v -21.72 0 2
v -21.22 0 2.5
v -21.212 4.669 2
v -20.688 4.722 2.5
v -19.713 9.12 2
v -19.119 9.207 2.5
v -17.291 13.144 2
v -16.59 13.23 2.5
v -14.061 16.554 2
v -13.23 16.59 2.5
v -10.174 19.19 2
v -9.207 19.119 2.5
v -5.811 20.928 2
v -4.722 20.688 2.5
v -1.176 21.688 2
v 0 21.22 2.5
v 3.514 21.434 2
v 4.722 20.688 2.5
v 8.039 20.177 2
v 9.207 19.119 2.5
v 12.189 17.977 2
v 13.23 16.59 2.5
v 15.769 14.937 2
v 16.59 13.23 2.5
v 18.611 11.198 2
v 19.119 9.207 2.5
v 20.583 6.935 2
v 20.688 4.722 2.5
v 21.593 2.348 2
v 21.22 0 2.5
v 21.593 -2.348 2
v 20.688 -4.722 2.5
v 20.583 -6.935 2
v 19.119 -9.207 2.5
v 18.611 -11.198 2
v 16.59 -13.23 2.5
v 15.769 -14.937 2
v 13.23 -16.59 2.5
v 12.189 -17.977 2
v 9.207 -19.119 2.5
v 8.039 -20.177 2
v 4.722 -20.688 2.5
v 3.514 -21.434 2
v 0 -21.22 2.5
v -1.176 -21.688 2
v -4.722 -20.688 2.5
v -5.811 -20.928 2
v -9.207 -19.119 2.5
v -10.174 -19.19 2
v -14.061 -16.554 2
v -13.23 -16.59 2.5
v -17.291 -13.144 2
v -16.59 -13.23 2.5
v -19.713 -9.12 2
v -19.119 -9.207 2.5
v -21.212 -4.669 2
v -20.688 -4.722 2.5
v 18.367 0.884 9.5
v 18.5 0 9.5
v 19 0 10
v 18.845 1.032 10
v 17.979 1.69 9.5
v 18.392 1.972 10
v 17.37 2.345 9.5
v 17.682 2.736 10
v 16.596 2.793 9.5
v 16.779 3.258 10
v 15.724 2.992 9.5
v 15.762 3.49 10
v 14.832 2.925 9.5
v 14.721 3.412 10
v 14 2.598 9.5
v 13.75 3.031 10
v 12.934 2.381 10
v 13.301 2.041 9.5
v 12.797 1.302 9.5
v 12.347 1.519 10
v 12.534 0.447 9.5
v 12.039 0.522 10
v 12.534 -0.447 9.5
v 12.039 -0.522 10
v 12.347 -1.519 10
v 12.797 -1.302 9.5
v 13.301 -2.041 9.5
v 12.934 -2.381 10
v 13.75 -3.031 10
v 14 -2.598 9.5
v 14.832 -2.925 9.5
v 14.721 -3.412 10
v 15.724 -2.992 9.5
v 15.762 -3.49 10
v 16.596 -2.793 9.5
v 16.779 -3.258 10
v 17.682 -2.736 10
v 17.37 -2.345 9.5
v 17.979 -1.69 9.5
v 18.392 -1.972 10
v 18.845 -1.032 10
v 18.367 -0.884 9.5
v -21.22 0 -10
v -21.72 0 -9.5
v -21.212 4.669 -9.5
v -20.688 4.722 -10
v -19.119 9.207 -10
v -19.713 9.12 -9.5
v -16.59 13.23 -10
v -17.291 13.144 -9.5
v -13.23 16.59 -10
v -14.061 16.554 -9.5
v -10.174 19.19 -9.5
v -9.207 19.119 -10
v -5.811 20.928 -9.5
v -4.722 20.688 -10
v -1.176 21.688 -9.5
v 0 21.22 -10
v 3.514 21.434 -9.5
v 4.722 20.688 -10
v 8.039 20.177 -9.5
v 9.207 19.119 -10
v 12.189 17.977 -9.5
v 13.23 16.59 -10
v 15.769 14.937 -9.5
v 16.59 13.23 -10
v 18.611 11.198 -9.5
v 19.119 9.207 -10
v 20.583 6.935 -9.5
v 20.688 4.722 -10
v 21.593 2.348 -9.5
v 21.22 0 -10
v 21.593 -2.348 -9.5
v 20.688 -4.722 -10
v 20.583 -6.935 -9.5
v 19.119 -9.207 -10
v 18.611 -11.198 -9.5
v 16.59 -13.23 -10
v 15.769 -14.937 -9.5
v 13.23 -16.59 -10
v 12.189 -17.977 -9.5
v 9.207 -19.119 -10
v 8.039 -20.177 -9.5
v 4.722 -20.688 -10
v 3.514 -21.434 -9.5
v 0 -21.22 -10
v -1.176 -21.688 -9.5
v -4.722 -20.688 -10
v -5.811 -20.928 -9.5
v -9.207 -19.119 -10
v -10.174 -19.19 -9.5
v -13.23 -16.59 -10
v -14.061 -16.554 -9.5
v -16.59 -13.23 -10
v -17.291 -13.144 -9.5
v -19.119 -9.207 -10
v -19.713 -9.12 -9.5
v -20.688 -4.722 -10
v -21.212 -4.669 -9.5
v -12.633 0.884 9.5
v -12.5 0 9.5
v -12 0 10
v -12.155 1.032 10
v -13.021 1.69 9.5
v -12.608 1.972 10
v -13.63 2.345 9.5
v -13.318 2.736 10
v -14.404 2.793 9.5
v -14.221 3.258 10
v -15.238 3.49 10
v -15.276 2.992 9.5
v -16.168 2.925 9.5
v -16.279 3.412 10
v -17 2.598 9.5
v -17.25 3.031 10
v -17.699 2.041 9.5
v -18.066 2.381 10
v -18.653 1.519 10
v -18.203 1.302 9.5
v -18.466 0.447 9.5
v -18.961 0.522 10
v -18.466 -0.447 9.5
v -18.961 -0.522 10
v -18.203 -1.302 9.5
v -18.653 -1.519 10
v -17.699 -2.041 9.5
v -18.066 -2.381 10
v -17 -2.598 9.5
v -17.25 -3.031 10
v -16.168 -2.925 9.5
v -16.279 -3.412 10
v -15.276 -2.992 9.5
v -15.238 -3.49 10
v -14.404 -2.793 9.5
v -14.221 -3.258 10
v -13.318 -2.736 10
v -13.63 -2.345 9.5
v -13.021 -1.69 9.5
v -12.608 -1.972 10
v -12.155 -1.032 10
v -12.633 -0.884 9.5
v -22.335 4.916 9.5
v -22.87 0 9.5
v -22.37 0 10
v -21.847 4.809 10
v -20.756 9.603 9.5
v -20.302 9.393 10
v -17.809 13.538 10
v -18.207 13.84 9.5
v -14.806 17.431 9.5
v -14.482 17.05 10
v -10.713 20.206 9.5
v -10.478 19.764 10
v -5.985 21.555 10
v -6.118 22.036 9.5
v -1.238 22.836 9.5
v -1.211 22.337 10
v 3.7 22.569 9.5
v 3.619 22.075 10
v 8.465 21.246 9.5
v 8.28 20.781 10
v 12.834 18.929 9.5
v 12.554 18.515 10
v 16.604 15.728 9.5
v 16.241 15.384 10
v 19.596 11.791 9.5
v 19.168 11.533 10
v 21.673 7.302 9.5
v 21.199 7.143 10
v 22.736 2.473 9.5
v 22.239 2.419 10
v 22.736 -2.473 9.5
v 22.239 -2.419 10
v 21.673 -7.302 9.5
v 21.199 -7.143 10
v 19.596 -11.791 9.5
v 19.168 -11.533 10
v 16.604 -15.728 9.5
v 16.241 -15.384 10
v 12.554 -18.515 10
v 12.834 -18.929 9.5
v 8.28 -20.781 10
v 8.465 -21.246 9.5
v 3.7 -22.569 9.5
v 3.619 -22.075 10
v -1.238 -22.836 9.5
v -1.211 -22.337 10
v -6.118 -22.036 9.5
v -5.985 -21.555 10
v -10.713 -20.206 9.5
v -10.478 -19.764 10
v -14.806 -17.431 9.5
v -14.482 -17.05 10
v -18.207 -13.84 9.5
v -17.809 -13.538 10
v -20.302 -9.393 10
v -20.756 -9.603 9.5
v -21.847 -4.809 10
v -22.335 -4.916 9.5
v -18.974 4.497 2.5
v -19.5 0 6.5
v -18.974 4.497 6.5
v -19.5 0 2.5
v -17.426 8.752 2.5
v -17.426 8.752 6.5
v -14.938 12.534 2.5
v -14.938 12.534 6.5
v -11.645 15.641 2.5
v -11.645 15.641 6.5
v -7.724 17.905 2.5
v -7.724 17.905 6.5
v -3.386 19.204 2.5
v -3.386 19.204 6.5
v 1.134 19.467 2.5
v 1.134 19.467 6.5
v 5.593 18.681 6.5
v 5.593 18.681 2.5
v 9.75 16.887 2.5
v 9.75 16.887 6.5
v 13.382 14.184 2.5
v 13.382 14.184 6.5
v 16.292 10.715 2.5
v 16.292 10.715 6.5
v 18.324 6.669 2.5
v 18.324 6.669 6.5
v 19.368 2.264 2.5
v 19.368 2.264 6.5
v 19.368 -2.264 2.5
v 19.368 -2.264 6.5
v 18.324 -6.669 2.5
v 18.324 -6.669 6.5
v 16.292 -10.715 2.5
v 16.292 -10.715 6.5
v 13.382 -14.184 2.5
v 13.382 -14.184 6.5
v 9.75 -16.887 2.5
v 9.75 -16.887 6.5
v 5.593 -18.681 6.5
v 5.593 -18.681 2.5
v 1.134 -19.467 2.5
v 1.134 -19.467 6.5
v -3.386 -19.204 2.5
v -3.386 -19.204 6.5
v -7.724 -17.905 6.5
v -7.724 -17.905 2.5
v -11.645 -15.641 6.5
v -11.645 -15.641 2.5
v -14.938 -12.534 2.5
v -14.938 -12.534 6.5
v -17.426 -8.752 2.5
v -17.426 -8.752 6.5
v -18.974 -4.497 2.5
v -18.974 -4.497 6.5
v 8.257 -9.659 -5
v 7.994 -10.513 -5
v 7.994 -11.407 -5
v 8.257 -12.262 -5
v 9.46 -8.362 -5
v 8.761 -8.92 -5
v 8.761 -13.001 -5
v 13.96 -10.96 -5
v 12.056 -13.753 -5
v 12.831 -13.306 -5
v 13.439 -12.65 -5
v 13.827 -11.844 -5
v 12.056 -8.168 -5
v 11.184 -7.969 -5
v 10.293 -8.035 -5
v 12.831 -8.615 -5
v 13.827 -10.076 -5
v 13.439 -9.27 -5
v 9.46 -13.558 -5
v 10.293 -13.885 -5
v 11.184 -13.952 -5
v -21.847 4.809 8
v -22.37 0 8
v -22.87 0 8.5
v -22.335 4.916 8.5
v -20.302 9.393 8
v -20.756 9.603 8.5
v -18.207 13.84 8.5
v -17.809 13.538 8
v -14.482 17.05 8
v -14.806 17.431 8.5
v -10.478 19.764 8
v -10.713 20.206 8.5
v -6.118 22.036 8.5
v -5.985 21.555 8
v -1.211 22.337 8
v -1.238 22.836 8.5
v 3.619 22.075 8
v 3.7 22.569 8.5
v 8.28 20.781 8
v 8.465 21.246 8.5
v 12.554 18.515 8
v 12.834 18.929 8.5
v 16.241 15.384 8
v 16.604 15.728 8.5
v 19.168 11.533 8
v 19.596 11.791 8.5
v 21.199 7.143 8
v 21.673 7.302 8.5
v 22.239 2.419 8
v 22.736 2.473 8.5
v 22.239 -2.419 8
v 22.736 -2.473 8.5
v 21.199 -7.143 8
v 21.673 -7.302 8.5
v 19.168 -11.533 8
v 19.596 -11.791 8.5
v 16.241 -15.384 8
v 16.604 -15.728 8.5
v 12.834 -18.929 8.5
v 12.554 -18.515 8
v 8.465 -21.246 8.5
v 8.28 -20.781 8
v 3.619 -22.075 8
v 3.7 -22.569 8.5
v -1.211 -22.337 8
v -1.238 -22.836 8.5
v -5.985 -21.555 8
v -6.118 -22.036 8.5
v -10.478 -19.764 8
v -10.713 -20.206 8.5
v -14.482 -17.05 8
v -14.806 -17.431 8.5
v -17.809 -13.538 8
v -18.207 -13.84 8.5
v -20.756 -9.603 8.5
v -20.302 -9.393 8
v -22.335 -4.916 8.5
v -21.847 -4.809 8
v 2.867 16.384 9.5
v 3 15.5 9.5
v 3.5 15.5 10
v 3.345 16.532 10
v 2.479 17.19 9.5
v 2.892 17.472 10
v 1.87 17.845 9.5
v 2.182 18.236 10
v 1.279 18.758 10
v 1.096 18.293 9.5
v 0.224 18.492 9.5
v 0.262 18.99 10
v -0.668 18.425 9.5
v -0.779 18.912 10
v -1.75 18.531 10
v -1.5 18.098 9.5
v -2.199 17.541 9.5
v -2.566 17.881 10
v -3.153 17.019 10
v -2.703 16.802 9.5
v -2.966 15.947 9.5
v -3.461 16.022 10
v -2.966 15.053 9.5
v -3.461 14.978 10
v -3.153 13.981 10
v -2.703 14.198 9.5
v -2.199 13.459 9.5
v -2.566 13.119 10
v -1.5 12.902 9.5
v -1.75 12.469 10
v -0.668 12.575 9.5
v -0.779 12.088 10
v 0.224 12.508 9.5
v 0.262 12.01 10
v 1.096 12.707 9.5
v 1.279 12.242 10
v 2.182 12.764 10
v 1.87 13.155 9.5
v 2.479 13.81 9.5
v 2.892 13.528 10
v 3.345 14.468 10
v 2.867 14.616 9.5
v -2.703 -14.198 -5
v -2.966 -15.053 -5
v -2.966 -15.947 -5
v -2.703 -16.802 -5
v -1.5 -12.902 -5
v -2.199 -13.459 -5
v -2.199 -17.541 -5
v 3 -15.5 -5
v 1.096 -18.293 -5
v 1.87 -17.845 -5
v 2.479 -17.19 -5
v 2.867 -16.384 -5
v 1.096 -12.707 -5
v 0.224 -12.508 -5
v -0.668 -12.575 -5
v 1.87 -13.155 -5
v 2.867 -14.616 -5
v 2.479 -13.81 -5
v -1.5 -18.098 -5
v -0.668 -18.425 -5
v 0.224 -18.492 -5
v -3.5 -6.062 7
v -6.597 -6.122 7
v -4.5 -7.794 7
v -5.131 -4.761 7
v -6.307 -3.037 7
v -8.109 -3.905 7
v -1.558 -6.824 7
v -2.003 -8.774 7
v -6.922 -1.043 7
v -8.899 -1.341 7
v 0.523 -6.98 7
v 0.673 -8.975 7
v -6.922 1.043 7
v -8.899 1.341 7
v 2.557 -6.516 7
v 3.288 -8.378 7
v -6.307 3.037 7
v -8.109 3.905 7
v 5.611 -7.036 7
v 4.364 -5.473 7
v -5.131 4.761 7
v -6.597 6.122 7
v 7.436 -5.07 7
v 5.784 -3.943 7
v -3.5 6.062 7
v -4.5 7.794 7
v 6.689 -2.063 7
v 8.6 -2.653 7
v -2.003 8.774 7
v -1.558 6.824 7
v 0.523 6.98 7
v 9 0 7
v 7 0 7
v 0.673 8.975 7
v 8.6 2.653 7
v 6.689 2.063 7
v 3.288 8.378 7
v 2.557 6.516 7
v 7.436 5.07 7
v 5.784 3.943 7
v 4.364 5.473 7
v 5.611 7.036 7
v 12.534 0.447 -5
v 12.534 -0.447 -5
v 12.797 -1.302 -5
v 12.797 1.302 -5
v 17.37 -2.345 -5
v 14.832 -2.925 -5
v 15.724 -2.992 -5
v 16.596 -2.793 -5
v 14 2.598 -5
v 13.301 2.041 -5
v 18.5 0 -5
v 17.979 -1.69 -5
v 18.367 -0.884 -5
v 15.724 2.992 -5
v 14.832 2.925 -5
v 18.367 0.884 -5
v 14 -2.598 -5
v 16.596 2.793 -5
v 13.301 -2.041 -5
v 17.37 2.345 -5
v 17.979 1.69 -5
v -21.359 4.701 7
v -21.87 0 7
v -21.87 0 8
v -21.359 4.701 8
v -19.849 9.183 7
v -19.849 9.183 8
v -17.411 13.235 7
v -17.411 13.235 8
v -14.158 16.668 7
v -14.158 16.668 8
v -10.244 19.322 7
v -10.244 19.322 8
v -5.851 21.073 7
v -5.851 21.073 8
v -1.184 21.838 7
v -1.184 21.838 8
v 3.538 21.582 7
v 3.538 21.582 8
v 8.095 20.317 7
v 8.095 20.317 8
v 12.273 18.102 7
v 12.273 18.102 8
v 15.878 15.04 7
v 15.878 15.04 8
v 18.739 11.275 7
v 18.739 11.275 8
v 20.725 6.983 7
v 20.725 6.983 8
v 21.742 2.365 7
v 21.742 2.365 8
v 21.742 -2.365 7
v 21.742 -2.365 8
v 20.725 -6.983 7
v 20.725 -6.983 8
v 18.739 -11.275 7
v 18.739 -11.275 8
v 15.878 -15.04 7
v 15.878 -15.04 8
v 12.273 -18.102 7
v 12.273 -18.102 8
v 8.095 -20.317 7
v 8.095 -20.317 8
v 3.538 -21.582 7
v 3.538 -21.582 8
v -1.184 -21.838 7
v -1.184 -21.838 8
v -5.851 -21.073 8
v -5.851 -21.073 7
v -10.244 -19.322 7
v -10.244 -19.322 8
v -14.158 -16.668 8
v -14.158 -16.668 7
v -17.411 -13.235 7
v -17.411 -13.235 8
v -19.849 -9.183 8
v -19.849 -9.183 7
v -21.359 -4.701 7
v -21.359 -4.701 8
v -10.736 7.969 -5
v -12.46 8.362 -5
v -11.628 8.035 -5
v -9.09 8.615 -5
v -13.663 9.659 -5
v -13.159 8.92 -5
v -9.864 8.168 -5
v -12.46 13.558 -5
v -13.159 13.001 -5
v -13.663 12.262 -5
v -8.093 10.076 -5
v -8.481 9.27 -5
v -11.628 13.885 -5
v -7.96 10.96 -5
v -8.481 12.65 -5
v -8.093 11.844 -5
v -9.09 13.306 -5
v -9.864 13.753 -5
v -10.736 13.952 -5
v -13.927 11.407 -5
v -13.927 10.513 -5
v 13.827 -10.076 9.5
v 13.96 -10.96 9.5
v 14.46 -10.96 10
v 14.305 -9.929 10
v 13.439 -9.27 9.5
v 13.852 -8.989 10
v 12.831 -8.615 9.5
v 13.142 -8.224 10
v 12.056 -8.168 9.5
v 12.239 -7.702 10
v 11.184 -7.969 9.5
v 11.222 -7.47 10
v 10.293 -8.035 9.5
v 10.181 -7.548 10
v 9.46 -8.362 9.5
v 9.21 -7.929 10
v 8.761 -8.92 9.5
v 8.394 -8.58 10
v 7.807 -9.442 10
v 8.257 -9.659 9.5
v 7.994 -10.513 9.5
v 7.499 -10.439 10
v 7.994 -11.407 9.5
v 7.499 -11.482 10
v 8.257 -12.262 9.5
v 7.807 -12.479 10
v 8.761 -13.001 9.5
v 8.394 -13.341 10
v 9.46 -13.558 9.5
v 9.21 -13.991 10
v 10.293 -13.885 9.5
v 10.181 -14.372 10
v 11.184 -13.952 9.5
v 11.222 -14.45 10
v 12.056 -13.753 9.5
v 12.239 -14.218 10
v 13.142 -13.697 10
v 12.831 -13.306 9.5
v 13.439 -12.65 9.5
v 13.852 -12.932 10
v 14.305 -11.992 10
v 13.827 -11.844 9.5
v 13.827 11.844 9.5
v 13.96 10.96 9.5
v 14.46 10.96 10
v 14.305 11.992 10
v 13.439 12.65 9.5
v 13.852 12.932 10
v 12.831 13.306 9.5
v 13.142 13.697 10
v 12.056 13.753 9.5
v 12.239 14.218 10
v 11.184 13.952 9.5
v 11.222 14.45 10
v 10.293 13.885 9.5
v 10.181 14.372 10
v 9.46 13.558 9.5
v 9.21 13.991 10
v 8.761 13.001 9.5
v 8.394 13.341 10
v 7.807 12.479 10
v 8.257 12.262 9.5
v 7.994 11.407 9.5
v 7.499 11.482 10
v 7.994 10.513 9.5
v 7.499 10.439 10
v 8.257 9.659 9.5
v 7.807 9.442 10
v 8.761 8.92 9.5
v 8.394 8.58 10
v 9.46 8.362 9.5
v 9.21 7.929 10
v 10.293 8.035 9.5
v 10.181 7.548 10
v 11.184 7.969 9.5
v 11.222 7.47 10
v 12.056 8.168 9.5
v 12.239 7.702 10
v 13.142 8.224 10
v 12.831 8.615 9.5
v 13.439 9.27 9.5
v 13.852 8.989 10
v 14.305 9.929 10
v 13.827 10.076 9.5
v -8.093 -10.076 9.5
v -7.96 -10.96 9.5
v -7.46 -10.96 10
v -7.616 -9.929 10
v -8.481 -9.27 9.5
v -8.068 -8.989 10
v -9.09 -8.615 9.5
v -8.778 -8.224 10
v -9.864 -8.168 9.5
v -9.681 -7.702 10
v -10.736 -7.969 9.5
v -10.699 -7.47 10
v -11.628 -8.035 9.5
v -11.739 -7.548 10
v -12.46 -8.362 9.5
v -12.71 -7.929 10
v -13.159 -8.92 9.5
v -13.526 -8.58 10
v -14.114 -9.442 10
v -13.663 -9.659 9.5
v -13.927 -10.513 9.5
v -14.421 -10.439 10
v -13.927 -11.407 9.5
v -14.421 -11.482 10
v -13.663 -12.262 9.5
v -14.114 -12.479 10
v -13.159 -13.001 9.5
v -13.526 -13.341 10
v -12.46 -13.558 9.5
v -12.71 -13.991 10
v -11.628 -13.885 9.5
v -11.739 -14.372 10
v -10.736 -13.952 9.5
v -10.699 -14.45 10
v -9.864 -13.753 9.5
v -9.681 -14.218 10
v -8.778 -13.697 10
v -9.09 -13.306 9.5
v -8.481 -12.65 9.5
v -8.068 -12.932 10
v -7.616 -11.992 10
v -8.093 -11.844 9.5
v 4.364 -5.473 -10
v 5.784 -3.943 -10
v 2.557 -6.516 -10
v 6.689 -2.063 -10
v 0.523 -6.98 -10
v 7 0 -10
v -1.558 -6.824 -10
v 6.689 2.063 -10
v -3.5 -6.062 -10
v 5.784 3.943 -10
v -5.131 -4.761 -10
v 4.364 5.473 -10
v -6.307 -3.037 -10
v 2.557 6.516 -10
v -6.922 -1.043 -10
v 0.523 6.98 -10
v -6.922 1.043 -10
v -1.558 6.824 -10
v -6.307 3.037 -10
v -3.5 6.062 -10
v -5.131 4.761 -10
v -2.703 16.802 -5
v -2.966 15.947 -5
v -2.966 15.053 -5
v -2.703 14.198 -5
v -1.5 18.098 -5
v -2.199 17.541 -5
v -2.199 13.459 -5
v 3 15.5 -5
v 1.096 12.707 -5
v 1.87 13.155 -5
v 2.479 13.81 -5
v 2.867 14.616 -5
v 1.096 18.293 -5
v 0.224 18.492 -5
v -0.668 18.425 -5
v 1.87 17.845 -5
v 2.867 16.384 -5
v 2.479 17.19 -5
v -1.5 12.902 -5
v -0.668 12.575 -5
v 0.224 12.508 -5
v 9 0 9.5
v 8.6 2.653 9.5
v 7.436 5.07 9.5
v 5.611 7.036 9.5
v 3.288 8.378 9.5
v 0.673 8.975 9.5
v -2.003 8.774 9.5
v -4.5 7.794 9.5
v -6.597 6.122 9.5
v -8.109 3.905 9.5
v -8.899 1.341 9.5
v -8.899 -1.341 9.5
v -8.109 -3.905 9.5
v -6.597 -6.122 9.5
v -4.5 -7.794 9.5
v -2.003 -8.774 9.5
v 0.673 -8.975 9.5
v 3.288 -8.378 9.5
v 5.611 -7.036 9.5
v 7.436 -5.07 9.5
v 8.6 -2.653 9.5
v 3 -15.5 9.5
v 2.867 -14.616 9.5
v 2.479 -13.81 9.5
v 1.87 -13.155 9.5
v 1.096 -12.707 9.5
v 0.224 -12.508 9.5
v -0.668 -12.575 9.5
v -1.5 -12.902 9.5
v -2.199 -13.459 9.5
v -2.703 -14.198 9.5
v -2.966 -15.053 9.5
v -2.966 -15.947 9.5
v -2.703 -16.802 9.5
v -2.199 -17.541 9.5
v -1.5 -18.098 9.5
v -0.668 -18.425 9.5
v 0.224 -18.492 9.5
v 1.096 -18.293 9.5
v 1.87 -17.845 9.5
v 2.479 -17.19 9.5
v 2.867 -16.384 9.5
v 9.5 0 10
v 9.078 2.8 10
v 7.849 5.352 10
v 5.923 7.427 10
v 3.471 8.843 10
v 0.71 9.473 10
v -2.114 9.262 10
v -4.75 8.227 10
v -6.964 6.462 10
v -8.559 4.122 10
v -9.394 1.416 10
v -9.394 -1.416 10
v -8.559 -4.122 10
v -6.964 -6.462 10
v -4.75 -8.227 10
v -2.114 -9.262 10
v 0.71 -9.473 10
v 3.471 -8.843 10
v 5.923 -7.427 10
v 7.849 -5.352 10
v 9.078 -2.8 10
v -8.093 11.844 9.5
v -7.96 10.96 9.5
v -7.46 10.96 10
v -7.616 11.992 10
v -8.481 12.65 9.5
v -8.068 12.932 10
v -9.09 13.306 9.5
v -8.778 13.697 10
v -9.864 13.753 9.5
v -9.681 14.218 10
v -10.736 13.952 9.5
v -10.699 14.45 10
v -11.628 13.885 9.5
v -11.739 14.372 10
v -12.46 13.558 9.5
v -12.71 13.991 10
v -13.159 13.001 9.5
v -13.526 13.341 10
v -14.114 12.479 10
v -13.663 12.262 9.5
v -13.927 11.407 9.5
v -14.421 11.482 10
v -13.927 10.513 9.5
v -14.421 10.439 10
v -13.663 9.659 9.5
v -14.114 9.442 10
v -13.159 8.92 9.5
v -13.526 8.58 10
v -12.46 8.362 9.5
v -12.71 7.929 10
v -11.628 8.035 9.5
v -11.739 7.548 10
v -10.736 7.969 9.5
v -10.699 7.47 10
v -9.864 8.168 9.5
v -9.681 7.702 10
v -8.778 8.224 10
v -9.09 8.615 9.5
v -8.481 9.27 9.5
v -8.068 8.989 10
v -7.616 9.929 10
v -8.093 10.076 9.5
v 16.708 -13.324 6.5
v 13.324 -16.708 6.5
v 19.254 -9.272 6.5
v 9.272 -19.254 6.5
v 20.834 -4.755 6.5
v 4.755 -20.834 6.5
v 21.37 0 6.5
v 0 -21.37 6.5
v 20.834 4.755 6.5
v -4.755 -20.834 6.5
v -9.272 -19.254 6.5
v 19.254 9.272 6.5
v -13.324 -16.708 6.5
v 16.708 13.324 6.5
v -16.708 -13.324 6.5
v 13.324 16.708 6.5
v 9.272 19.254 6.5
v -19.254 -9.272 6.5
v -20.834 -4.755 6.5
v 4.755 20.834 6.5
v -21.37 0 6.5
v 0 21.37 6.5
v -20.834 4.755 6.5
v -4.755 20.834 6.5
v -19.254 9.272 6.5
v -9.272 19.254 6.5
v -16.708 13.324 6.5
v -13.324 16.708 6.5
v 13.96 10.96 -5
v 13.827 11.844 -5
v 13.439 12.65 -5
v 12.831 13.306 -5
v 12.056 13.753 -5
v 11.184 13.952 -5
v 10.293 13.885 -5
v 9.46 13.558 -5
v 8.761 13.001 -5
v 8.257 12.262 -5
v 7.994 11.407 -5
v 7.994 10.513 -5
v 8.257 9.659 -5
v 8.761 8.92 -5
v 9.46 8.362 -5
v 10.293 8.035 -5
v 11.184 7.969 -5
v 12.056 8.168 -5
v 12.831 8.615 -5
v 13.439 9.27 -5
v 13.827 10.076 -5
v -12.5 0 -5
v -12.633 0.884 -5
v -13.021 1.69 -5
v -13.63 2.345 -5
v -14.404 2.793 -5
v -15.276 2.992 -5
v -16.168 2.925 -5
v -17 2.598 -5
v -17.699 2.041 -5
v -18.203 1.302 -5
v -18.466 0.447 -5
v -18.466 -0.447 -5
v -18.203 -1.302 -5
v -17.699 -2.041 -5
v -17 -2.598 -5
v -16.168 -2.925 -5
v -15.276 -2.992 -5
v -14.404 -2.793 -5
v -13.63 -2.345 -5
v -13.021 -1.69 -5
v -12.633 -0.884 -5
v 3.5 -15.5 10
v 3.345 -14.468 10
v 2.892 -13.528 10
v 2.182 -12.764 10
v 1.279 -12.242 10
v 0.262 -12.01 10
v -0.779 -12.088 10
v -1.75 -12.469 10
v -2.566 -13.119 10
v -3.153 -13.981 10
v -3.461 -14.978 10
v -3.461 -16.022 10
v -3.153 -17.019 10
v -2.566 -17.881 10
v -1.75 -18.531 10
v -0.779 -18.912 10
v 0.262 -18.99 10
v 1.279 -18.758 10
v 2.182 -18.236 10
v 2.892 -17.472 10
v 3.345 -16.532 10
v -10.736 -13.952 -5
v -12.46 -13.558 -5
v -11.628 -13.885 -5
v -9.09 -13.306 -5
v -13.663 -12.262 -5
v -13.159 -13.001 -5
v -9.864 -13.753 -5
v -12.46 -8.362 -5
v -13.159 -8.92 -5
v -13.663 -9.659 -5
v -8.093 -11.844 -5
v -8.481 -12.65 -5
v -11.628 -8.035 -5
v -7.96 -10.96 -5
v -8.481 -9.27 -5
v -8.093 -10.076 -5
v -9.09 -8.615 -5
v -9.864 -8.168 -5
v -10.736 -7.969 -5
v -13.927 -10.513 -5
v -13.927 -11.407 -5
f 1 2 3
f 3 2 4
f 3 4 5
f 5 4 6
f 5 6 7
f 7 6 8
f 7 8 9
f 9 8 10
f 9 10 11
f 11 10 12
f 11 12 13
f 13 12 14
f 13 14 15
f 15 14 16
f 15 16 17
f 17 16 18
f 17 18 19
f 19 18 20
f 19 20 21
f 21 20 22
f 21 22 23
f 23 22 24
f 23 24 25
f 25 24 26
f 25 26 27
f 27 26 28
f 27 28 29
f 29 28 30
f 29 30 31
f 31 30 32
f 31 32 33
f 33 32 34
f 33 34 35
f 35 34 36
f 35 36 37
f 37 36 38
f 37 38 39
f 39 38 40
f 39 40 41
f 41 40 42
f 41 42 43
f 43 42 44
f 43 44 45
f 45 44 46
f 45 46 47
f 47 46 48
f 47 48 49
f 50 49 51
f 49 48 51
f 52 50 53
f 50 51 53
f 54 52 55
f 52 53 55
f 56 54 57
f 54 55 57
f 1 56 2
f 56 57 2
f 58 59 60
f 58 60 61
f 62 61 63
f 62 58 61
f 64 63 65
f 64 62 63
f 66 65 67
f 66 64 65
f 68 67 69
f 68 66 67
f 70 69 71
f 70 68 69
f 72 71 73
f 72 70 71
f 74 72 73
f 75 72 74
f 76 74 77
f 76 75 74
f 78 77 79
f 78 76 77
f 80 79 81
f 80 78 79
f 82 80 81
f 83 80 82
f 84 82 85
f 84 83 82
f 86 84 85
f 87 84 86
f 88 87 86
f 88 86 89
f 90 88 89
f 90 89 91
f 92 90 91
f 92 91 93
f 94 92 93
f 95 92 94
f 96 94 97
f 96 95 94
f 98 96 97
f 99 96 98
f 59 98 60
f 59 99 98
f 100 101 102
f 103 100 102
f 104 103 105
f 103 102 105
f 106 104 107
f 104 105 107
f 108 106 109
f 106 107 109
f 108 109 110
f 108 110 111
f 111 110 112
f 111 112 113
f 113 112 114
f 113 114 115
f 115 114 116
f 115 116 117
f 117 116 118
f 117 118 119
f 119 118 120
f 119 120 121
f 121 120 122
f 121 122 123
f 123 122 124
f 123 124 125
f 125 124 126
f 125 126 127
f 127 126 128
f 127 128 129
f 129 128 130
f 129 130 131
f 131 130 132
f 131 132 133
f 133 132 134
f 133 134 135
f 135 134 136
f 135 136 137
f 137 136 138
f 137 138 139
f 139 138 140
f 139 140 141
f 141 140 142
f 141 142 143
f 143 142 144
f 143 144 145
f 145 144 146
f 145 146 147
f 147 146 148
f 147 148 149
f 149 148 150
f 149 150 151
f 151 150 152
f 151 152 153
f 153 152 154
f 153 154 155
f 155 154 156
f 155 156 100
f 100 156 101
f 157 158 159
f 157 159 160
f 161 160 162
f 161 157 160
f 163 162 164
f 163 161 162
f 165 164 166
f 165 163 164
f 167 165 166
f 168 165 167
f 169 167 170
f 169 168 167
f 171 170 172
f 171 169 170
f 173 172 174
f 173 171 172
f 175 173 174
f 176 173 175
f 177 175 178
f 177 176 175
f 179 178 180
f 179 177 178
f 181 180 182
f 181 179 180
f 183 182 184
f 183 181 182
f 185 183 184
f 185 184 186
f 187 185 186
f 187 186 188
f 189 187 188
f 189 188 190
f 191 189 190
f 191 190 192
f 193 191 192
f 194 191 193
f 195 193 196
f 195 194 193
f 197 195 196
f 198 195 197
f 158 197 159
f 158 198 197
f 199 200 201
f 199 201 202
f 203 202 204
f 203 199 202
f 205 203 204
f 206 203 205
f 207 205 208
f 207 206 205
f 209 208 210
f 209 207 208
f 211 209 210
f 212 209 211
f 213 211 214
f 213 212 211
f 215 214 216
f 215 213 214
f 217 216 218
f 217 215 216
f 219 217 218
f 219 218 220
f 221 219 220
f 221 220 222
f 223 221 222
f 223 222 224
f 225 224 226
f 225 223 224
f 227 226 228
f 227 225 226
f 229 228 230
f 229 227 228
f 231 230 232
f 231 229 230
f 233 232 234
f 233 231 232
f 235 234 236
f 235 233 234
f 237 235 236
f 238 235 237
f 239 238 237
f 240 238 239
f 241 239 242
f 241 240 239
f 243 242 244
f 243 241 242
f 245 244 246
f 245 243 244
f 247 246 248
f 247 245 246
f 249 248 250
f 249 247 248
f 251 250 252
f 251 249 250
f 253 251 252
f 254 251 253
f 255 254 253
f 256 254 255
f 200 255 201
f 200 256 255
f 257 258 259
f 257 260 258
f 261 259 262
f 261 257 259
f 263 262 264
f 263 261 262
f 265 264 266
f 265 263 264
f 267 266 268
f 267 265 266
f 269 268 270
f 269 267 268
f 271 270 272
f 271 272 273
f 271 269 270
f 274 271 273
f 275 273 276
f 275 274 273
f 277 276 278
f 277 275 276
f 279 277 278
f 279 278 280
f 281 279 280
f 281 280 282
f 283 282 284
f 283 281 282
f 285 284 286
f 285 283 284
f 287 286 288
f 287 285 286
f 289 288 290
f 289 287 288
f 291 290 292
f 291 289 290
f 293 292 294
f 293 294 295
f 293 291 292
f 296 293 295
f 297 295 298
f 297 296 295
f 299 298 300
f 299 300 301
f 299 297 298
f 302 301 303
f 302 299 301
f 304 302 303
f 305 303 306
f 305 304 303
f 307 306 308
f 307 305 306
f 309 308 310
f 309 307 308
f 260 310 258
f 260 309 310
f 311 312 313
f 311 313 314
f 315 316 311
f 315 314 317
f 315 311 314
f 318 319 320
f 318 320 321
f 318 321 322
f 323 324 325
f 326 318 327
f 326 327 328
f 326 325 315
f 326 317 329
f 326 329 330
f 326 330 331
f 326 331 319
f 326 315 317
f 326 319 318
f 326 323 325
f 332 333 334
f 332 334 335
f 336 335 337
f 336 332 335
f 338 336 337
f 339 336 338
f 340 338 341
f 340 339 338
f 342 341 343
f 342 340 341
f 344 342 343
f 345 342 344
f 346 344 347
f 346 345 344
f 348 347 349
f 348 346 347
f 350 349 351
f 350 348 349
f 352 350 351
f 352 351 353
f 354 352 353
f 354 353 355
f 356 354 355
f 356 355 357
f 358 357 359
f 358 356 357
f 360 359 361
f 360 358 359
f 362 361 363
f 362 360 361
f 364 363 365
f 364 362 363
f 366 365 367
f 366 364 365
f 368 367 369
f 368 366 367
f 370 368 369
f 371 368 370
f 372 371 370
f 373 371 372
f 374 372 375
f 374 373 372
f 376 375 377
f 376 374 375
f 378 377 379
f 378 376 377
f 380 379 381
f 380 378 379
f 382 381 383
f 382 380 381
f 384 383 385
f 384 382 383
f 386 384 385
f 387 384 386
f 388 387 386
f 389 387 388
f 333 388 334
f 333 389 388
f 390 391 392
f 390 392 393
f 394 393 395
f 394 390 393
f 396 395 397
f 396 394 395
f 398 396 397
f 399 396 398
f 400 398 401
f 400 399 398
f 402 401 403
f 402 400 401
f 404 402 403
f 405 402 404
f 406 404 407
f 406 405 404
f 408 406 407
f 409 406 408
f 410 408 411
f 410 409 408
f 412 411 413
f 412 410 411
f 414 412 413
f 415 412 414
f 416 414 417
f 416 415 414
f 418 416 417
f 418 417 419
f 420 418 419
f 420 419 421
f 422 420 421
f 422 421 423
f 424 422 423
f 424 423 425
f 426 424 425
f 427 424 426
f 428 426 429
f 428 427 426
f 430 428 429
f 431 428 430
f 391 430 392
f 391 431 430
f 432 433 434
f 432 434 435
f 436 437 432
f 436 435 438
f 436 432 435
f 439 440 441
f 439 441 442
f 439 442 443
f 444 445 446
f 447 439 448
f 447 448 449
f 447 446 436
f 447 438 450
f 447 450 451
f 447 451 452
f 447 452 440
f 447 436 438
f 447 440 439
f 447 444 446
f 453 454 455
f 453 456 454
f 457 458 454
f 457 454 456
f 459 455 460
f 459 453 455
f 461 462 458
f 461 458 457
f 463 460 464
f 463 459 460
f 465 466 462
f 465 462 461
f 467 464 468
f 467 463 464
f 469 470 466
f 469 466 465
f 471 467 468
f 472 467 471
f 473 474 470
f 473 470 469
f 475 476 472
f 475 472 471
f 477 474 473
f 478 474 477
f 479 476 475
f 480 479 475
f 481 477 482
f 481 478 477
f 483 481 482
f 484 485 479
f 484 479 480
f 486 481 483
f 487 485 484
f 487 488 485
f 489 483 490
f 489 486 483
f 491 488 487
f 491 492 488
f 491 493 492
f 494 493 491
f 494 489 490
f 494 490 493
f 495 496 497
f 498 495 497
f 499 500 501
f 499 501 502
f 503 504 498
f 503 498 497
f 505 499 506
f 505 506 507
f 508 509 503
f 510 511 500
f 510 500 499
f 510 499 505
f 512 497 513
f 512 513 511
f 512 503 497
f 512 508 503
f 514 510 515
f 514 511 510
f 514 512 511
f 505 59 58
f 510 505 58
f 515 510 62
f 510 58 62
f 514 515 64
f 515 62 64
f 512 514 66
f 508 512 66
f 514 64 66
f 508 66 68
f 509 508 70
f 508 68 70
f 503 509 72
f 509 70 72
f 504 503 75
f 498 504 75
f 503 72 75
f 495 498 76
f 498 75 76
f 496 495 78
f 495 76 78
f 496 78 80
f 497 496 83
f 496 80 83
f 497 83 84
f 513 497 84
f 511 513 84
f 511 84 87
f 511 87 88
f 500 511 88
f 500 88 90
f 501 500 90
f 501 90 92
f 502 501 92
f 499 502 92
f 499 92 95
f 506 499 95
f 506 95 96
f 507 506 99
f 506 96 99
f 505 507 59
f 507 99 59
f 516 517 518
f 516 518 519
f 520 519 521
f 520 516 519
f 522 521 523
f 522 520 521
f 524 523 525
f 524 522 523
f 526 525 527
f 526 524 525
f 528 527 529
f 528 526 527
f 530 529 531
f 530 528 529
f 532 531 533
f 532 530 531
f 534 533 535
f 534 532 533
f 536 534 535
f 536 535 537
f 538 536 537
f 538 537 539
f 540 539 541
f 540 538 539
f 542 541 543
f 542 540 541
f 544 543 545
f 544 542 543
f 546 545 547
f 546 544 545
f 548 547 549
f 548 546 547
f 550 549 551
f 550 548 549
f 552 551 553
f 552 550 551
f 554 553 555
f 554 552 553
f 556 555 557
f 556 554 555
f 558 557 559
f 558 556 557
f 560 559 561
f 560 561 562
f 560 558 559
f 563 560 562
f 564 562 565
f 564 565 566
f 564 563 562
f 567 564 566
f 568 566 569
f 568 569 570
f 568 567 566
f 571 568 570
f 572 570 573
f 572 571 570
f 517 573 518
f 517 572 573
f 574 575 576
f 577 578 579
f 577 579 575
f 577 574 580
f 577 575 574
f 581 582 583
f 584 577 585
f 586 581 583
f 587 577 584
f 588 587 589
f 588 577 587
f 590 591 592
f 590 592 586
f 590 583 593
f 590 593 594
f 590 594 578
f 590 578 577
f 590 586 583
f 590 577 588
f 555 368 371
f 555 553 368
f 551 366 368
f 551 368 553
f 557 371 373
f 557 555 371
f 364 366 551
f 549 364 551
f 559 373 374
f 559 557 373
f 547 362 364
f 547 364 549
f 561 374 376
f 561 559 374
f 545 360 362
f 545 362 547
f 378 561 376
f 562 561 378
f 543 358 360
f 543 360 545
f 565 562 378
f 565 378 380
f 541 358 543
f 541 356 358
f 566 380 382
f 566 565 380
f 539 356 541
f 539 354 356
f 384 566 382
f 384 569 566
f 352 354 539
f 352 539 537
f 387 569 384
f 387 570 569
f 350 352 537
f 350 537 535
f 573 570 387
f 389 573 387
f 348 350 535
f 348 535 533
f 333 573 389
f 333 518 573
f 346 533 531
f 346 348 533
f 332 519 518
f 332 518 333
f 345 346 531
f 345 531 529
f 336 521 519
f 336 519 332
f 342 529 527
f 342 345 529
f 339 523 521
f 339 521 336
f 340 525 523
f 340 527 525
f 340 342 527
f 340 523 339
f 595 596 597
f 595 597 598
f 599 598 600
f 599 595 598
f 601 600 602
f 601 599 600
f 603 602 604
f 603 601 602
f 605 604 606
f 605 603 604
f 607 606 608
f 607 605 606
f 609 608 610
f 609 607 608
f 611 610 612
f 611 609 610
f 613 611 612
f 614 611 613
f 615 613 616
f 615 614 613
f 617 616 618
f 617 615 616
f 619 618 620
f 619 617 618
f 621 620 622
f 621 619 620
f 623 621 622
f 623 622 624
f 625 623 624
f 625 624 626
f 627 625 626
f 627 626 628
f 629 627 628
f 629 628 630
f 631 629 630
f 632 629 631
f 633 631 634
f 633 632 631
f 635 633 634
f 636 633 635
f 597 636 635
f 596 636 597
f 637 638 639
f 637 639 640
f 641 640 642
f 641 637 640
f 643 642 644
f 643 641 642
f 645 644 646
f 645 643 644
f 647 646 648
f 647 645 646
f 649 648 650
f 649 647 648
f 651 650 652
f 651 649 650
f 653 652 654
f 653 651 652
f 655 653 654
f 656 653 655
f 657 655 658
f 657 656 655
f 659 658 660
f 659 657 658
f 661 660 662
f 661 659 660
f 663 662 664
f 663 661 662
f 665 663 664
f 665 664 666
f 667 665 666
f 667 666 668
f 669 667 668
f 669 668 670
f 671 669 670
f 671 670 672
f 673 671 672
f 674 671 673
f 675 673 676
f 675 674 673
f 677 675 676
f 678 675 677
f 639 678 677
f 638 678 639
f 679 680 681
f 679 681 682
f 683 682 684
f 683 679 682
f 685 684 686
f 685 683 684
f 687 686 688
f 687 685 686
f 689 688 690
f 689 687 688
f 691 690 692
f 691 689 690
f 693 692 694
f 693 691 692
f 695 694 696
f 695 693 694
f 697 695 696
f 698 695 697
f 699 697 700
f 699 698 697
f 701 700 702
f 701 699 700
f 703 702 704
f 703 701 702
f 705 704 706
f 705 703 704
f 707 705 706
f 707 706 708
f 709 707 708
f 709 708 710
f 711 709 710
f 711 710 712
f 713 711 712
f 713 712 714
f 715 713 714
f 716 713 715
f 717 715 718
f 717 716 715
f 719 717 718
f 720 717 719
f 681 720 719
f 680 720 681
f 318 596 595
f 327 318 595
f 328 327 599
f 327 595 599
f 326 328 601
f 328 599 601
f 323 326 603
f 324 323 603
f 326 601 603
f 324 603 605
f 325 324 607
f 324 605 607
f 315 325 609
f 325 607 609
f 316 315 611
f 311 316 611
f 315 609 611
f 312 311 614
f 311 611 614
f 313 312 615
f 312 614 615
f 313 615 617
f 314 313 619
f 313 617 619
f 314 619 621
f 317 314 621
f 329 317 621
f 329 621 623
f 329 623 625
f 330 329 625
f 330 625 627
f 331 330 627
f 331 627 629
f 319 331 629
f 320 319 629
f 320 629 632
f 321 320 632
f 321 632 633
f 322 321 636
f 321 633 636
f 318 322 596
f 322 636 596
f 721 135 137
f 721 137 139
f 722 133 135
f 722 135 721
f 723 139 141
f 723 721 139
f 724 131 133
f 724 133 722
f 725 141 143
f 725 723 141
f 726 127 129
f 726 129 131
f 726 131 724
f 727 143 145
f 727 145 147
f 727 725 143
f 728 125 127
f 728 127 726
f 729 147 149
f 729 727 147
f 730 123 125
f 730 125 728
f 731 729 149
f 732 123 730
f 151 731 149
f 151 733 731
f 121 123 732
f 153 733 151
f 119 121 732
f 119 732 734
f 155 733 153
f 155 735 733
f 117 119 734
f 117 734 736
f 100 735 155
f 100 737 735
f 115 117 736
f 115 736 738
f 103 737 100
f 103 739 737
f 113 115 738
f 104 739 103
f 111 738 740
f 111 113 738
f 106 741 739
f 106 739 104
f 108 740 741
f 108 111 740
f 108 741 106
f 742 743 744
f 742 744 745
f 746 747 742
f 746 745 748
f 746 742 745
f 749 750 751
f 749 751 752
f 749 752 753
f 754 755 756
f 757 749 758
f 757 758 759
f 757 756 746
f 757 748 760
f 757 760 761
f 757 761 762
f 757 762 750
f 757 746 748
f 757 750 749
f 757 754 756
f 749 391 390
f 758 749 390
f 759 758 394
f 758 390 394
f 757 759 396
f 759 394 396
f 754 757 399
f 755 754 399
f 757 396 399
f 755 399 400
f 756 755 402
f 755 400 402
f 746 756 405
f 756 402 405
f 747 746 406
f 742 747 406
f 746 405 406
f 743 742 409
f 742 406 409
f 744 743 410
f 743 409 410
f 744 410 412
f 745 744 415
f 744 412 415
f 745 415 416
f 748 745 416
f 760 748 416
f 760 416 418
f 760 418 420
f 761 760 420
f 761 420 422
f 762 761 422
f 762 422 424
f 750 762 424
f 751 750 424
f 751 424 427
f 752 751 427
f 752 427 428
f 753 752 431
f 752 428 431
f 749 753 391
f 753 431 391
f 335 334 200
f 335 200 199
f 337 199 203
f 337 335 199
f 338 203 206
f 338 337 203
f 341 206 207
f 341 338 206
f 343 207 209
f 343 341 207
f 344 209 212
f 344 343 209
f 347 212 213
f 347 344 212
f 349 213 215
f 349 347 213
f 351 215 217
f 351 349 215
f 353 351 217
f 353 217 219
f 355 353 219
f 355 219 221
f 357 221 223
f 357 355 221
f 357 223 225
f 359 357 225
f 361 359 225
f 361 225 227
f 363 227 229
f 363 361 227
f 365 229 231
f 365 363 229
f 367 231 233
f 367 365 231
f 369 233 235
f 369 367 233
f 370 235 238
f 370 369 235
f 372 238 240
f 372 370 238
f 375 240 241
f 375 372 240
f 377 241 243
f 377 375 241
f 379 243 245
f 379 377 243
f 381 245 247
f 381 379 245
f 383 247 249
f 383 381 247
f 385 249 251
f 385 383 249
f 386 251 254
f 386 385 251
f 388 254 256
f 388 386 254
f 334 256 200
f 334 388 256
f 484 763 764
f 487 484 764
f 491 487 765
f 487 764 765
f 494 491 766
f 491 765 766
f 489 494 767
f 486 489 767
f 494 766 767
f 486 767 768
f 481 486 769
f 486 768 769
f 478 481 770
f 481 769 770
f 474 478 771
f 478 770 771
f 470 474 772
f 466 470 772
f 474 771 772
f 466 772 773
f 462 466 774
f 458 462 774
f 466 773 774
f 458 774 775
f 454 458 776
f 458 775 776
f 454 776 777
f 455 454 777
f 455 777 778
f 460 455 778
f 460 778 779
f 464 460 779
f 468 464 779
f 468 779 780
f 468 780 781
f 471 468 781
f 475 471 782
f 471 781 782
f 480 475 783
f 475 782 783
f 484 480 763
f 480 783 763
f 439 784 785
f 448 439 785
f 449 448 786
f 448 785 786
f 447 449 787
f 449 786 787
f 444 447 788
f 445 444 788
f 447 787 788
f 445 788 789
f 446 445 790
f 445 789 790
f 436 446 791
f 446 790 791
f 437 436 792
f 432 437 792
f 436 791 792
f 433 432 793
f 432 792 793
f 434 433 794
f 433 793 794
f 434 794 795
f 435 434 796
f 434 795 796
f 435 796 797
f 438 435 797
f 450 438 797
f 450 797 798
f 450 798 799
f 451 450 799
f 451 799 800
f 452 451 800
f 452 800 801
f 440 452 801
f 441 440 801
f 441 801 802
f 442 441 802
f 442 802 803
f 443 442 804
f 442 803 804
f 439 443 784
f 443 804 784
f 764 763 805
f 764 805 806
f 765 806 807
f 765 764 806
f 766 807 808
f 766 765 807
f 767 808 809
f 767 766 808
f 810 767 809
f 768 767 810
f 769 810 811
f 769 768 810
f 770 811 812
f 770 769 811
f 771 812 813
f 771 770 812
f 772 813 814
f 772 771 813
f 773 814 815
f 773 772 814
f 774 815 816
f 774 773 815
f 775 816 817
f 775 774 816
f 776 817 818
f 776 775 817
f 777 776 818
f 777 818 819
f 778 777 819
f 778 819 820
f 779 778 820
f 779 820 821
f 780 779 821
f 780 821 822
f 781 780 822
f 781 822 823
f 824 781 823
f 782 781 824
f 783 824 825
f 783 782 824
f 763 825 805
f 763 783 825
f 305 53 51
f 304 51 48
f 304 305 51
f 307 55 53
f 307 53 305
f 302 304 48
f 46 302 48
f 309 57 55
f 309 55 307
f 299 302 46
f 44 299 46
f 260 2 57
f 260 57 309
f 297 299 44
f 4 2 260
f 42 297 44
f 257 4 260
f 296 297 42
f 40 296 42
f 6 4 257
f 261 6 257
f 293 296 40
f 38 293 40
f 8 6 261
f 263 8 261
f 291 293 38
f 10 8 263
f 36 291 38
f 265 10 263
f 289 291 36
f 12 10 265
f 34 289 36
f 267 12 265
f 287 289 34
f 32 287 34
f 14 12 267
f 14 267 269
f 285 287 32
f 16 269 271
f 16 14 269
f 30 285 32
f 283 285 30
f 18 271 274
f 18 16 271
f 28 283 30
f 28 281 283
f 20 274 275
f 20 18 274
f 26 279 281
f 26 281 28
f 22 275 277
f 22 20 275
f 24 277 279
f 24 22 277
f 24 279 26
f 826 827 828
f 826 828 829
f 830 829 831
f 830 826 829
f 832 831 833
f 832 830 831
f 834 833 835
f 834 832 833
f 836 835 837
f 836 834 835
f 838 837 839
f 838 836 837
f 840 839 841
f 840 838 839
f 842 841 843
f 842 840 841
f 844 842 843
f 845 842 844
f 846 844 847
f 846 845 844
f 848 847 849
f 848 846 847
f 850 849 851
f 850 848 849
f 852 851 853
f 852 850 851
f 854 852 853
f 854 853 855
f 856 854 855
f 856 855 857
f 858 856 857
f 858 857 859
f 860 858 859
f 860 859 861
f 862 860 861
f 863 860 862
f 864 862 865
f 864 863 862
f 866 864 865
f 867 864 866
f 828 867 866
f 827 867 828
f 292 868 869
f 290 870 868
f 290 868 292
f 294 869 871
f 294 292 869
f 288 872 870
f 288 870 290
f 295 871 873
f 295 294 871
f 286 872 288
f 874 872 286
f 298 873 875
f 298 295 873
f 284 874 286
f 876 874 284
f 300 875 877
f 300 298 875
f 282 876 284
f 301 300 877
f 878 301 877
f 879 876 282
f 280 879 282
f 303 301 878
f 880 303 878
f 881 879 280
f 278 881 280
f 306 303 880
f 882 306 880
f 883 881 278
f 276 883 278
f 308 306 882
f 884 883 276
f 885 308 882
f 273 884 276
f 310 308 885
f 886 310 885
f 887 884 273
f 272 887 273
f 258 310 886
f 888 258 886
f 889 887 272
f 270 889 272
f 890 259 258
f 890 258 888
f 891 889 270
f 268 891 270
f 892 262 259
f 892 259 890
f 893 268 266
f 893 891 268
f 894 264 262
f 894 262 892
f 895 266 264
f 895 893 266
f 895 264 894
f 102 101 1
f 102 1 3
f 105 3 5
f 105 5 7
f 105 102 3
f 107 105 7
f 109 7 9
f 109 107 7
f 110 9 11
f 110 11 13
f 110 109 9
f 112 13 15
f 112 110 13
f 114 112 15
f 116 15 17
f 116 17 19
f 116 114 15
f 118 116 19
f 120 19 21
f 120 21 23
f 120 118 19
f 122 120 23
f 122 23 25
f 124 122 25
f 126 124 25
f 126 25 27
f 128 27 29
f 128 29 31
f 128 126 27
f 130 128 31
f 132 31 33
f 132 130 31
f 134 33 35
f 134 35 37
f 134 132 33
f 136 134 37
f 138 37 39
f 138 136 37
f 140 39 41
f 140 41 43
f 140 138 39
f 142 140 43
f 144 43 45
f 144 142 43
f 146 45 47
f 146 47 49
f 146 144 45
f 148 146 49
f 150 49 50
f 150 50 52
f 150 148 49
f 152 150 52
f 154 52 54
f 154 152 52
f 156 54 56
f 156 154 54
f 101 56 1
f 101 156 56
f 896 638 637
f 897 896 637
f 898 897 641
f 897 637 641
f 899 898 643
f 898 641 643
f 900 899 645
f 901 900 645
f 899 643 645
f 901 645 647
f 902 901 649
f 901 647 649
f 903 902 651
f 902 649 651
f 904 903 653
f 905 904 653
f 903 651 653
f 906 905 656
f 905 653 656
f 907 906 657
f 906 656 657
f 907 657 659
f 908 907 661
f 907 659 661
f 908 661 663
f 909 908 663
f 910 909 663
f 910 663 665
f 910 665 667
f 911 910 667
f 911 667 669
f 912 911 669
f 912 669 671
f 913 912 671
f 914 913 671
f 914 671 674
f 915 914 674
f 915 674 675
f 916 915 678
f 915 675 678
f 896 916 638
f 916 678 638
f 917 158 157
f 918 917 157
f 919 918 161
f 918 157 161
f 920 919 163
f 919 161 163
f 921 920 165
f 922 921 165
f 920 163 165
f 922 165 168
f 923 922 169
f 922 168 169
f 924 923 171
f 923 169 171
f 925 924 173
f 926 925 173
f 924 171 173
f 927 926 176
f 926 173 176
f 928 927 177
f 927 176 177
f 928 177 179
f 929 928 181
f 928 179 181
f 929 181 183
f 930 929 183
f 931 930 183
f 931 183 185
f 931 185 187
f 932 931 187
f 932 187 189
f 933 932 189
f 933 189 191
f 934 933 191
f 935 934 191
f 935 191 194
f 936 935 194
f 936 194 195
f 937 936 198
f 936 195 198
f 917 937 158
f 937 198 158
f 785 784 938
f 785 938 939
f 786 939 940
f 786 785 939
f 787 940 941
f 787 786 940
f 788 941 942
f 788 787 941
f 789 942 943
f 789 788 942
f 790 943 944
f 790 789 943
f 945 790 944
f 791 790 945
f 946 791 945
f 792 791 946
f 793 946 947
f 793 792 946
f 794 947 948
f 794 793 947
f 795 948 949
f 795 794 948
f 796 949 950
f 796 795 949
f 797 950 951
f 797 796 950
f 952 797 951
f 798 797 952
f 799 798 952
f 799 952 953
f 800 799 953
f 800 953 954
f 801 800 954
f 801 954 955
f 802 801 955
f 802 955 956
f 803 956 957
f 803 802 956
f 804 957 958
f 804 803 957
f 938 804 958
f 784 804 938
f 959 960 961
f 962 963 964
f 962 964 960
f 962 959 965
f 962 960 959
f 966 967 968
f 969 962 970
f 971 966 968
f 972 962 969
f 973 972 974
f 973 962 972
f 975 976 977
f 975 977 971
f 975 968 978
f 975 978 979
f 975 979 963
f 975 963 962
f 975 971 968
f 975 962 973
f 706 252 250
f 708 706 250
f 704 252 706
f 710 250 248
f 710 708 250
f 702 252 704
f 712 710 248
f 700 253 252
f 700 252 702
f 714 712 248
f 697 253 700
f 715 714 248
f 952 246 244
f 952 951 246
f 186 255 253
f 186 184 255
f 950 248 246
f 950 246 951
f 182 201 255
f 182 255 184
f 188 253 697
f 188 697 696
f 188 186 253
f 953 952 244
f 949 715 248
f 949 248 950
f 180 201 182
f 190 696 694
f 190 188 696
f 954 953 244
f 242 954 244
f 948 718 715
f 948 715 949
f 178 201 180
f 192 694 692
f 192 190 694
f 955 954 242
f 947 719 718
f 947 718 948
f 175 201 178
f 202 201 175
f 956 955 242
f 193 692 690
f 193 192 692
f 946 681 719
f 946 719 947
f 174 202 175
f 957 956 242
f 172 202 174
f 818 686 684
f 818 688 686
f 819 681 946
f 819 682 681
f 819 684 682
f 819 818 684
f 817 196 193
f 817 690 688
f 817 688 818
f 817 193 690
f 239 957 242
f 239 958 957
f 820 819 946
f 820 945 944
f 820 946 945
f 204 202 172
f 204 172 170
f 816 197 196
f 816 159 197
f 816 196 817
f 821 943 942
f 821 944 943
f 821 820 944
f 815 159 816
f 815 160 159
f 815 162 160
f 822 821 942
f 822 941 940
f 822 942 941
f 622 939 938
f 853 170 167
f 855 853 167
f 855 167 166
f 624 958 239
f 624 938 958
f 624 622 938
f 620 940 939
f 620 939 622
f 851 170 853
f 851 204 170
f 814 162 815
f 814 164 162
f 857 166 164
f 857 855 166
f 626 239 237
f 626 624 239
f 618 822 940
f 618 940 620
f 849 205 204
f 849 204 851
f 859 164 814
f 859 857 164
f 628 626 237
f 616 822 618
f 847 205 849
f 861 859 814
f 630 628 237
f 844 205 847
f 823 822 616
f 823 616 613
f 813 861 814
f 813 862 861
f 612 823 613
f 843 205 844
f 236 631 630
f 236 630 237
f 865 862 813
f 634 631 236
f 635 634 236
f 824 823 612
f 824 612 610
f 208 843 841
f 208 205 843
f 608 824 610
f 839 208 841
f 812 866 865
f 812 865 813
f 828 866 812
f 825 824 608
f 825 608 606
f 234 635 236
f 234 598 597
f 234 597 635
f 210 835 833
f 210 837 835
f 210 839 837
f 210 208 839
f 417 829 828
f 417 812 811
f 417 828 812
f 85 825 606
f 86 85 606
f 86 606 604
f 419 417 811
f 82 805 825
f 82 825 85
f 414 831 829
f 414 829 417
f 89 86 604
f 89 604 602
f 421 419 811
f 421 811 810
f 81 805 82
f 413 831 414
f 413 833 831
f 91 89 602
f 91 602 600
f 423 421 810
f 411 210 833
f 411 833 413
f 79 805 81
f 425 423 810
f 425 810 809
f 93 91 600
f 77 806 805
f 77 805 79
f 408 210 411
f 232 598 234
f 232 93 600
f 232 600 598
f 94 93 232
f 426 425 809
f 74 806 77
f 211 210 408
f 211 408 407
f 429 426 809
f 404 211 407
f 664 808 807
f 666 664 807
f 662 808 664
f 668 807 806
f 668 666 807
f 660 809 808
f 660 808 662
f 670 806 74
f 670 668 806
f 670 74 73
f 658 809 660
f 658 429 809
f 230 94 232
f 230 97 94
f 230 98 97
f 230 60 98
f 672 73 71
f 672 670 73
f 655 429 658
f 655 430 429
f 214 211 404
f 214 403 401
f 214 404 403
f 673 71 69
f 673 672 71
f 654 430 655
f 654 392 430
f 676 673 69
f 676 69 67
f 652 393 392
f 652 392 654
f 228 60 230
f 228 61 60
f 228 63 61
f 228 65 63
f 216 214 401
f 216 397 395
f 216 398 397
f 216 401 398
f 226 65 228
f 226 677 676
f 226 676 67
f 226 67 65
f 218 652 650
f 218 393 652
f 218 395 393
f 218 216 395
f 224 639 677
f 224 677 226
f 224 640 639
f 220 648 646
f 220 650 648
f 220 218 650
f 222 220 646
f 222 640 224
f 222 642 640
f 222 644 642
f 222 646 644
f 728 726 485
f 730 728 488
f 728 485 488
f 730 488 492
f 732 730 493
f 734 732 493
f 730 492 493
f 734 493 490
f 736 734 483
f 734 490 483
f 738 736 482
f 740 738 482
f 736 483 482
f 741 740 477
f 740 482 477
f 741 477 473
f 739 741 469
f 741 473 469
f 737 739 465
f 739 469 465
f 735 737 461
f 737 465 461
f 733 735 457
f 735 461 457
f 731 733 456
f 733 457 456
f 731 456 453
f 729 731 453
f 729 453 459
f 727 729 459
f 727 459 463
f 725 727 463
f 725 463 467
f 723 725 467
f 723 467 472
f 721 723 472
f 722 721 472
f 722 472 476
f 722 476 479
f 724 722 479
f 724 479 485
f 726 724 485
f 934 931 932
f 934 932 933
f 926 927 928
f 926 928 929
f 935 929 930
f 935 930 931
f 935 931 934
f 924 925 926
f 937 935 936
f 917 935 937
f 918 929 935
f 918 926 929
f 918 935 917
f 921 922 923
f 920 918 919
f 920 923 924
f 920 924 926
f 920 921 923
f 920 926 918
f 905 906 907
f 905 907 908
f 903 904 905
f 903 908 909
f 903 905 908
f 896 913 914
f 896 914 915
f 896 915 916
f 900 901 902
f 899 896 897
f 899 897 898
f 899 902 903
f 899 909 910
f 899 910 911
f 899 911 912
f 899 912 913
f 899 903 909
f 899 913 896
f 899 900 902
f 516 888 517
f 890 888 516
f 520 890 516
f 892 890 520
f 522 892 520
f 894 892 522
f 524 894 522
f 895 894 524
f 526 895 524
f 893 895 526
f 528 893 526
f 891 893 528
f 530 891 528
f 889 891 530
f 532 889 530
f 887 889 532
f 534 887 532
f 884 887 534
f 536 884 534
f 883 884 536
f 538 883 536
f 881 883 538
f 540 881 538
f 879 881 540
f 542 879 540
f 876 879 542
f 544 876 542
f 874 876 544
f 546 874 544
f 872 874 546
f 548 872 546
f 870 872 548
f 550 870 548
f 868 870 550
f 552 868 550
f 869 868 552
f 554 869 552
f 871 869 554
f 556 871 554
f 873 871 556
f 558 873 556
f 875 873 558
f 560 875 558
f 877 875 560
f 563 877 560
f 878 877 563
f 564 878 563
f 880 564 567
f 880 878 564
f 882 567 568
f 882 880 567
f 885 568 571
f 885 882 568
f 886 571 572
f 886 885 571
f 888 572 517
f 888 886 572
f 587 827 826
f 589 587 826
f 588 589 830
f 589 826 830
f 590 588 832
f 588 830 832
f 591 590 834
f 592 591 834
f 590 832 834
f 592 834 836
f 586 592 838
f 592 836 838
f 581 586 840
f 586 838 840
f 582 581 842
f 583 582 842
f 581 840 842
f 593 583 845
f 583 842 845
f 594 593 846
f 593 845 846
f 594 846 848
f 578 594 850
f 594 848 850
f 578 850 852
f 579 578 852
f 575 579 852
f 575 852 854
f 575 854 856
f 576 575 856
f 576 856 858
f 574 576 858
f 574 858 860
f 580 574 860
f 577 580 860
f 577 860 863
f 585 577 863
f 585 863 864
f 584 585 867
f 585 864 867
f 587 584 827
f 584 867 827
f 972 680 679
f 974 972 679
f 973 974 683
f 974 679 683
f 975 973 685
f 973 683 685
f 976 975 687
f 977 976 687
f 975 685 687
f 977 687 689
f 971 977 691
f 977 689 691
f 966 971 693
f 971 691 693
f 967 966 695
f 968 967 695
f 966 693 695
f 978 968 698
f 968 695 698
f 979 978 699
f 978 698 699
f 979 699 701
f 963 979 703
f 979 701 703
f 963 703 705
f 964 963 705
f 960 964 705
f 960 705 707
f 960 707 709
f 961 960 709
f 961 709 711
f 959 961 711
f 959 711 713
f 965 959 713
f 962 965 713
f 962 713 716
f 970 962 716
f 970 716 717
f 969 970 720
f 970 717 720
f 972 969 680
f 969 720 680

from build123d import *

# Parameters (mm, degrees)
F2_R     = 7
F3_DEPTH = 20.001
F2_R_2   = 3
F4_DEPTH = 15
F2_R_3   = 9
F5_DEPTH = 3
F6_SIZE  = 0.5
F7_SIZE  = 0.5


with BuildPart() as f1:
    # F0 (on Front) → F1 (revolve)
    with BuildSketch(Plane.XZ):
        Polygon((0, -10), (0, 10), (-22.87, 10), (-22.87, 8), (-21.87, 8), (-21.87, 6.5), (-19.5, 6.5), (-19.5, 2.5), (-21.72, 2.5), (-21.72, -10), align=None)
    revolve(axis=Axis((0, 0, 0), (0, 0, -1)))

    # F2 (on face) → F3 (cut, through all)
    with BuildSketch(Plane.XY.offset(10)):
        Circle(F2_R)
    extrude(amount=-F3_DEPTH, mode=Mode.SUBTRACT)

    # F2 (on face) → F4 (cut)
    with BuildSketch(Plane.XY.offset(10)):
        with Locations((-10.960155, 10.960155)):
            Circle(F2_R_2)
        with Locations((10.960155, 10.960155)):
            Circle(F2_R_2)
        with Locations((15.5, 0)):
            Circle(F2_R_2)
        with Locations((10.960155, -10.960155)):
            Circle(F2_R_2)
        with Locations((0, -15.5)):
            Circle(F2_R_2)
        with Locations((-10.960155, -10.960155)):
            Circle(F2_R_2)
        with Locations((-15.5, 0)):
            Circle(F2_R_2)
        with Locations((0, 15.5)):
            Circle(F2_R_2)
    extrude(amount=-F4_DEPTH, mode=Mode.SUBTRACT)

    # F2 (on face) → F5 (cut)
    with BuildSketch(Plane.XY.offset(10)):
        Circle(F2_R_3)
        Circle(F2_R, mode=Mode.SUBTRACT)
    extrude(amount=-F5_DEPTH, mode=Mode.SUBTRACT)

    # F6
    f6_edges = [f1.edges().sort_by_distance(p)[0] for p in [
        (22.87, 0, 10),
        (-13.960155, -10.960155, 10),
        (-3, -15.5, 10),
        (7.960155, -10.960155, 10),
        (-18.5, 0, 10),
        (-13.960155, 10.960155, 10),
        (-9, 0, 10),
        (12.5, 0, 10),
        (-3, 15.5, 10),
        (7.960155, 10.960155, 10),
    ]]
    chamfer(f6_edges, length=F6_SIZE)

    # F7
    f7_edges = [f1.edges().sort_by_distance(p)[0] for p in [
        (22.87, 0, 8),
        (21.87, 0, 6.5),
        (21.72, 0, 2.5),
        (21.72, 0, -10),
    ]]
    chamfer(f7_edges, length=F7_SIZE)


solid = f1.part
